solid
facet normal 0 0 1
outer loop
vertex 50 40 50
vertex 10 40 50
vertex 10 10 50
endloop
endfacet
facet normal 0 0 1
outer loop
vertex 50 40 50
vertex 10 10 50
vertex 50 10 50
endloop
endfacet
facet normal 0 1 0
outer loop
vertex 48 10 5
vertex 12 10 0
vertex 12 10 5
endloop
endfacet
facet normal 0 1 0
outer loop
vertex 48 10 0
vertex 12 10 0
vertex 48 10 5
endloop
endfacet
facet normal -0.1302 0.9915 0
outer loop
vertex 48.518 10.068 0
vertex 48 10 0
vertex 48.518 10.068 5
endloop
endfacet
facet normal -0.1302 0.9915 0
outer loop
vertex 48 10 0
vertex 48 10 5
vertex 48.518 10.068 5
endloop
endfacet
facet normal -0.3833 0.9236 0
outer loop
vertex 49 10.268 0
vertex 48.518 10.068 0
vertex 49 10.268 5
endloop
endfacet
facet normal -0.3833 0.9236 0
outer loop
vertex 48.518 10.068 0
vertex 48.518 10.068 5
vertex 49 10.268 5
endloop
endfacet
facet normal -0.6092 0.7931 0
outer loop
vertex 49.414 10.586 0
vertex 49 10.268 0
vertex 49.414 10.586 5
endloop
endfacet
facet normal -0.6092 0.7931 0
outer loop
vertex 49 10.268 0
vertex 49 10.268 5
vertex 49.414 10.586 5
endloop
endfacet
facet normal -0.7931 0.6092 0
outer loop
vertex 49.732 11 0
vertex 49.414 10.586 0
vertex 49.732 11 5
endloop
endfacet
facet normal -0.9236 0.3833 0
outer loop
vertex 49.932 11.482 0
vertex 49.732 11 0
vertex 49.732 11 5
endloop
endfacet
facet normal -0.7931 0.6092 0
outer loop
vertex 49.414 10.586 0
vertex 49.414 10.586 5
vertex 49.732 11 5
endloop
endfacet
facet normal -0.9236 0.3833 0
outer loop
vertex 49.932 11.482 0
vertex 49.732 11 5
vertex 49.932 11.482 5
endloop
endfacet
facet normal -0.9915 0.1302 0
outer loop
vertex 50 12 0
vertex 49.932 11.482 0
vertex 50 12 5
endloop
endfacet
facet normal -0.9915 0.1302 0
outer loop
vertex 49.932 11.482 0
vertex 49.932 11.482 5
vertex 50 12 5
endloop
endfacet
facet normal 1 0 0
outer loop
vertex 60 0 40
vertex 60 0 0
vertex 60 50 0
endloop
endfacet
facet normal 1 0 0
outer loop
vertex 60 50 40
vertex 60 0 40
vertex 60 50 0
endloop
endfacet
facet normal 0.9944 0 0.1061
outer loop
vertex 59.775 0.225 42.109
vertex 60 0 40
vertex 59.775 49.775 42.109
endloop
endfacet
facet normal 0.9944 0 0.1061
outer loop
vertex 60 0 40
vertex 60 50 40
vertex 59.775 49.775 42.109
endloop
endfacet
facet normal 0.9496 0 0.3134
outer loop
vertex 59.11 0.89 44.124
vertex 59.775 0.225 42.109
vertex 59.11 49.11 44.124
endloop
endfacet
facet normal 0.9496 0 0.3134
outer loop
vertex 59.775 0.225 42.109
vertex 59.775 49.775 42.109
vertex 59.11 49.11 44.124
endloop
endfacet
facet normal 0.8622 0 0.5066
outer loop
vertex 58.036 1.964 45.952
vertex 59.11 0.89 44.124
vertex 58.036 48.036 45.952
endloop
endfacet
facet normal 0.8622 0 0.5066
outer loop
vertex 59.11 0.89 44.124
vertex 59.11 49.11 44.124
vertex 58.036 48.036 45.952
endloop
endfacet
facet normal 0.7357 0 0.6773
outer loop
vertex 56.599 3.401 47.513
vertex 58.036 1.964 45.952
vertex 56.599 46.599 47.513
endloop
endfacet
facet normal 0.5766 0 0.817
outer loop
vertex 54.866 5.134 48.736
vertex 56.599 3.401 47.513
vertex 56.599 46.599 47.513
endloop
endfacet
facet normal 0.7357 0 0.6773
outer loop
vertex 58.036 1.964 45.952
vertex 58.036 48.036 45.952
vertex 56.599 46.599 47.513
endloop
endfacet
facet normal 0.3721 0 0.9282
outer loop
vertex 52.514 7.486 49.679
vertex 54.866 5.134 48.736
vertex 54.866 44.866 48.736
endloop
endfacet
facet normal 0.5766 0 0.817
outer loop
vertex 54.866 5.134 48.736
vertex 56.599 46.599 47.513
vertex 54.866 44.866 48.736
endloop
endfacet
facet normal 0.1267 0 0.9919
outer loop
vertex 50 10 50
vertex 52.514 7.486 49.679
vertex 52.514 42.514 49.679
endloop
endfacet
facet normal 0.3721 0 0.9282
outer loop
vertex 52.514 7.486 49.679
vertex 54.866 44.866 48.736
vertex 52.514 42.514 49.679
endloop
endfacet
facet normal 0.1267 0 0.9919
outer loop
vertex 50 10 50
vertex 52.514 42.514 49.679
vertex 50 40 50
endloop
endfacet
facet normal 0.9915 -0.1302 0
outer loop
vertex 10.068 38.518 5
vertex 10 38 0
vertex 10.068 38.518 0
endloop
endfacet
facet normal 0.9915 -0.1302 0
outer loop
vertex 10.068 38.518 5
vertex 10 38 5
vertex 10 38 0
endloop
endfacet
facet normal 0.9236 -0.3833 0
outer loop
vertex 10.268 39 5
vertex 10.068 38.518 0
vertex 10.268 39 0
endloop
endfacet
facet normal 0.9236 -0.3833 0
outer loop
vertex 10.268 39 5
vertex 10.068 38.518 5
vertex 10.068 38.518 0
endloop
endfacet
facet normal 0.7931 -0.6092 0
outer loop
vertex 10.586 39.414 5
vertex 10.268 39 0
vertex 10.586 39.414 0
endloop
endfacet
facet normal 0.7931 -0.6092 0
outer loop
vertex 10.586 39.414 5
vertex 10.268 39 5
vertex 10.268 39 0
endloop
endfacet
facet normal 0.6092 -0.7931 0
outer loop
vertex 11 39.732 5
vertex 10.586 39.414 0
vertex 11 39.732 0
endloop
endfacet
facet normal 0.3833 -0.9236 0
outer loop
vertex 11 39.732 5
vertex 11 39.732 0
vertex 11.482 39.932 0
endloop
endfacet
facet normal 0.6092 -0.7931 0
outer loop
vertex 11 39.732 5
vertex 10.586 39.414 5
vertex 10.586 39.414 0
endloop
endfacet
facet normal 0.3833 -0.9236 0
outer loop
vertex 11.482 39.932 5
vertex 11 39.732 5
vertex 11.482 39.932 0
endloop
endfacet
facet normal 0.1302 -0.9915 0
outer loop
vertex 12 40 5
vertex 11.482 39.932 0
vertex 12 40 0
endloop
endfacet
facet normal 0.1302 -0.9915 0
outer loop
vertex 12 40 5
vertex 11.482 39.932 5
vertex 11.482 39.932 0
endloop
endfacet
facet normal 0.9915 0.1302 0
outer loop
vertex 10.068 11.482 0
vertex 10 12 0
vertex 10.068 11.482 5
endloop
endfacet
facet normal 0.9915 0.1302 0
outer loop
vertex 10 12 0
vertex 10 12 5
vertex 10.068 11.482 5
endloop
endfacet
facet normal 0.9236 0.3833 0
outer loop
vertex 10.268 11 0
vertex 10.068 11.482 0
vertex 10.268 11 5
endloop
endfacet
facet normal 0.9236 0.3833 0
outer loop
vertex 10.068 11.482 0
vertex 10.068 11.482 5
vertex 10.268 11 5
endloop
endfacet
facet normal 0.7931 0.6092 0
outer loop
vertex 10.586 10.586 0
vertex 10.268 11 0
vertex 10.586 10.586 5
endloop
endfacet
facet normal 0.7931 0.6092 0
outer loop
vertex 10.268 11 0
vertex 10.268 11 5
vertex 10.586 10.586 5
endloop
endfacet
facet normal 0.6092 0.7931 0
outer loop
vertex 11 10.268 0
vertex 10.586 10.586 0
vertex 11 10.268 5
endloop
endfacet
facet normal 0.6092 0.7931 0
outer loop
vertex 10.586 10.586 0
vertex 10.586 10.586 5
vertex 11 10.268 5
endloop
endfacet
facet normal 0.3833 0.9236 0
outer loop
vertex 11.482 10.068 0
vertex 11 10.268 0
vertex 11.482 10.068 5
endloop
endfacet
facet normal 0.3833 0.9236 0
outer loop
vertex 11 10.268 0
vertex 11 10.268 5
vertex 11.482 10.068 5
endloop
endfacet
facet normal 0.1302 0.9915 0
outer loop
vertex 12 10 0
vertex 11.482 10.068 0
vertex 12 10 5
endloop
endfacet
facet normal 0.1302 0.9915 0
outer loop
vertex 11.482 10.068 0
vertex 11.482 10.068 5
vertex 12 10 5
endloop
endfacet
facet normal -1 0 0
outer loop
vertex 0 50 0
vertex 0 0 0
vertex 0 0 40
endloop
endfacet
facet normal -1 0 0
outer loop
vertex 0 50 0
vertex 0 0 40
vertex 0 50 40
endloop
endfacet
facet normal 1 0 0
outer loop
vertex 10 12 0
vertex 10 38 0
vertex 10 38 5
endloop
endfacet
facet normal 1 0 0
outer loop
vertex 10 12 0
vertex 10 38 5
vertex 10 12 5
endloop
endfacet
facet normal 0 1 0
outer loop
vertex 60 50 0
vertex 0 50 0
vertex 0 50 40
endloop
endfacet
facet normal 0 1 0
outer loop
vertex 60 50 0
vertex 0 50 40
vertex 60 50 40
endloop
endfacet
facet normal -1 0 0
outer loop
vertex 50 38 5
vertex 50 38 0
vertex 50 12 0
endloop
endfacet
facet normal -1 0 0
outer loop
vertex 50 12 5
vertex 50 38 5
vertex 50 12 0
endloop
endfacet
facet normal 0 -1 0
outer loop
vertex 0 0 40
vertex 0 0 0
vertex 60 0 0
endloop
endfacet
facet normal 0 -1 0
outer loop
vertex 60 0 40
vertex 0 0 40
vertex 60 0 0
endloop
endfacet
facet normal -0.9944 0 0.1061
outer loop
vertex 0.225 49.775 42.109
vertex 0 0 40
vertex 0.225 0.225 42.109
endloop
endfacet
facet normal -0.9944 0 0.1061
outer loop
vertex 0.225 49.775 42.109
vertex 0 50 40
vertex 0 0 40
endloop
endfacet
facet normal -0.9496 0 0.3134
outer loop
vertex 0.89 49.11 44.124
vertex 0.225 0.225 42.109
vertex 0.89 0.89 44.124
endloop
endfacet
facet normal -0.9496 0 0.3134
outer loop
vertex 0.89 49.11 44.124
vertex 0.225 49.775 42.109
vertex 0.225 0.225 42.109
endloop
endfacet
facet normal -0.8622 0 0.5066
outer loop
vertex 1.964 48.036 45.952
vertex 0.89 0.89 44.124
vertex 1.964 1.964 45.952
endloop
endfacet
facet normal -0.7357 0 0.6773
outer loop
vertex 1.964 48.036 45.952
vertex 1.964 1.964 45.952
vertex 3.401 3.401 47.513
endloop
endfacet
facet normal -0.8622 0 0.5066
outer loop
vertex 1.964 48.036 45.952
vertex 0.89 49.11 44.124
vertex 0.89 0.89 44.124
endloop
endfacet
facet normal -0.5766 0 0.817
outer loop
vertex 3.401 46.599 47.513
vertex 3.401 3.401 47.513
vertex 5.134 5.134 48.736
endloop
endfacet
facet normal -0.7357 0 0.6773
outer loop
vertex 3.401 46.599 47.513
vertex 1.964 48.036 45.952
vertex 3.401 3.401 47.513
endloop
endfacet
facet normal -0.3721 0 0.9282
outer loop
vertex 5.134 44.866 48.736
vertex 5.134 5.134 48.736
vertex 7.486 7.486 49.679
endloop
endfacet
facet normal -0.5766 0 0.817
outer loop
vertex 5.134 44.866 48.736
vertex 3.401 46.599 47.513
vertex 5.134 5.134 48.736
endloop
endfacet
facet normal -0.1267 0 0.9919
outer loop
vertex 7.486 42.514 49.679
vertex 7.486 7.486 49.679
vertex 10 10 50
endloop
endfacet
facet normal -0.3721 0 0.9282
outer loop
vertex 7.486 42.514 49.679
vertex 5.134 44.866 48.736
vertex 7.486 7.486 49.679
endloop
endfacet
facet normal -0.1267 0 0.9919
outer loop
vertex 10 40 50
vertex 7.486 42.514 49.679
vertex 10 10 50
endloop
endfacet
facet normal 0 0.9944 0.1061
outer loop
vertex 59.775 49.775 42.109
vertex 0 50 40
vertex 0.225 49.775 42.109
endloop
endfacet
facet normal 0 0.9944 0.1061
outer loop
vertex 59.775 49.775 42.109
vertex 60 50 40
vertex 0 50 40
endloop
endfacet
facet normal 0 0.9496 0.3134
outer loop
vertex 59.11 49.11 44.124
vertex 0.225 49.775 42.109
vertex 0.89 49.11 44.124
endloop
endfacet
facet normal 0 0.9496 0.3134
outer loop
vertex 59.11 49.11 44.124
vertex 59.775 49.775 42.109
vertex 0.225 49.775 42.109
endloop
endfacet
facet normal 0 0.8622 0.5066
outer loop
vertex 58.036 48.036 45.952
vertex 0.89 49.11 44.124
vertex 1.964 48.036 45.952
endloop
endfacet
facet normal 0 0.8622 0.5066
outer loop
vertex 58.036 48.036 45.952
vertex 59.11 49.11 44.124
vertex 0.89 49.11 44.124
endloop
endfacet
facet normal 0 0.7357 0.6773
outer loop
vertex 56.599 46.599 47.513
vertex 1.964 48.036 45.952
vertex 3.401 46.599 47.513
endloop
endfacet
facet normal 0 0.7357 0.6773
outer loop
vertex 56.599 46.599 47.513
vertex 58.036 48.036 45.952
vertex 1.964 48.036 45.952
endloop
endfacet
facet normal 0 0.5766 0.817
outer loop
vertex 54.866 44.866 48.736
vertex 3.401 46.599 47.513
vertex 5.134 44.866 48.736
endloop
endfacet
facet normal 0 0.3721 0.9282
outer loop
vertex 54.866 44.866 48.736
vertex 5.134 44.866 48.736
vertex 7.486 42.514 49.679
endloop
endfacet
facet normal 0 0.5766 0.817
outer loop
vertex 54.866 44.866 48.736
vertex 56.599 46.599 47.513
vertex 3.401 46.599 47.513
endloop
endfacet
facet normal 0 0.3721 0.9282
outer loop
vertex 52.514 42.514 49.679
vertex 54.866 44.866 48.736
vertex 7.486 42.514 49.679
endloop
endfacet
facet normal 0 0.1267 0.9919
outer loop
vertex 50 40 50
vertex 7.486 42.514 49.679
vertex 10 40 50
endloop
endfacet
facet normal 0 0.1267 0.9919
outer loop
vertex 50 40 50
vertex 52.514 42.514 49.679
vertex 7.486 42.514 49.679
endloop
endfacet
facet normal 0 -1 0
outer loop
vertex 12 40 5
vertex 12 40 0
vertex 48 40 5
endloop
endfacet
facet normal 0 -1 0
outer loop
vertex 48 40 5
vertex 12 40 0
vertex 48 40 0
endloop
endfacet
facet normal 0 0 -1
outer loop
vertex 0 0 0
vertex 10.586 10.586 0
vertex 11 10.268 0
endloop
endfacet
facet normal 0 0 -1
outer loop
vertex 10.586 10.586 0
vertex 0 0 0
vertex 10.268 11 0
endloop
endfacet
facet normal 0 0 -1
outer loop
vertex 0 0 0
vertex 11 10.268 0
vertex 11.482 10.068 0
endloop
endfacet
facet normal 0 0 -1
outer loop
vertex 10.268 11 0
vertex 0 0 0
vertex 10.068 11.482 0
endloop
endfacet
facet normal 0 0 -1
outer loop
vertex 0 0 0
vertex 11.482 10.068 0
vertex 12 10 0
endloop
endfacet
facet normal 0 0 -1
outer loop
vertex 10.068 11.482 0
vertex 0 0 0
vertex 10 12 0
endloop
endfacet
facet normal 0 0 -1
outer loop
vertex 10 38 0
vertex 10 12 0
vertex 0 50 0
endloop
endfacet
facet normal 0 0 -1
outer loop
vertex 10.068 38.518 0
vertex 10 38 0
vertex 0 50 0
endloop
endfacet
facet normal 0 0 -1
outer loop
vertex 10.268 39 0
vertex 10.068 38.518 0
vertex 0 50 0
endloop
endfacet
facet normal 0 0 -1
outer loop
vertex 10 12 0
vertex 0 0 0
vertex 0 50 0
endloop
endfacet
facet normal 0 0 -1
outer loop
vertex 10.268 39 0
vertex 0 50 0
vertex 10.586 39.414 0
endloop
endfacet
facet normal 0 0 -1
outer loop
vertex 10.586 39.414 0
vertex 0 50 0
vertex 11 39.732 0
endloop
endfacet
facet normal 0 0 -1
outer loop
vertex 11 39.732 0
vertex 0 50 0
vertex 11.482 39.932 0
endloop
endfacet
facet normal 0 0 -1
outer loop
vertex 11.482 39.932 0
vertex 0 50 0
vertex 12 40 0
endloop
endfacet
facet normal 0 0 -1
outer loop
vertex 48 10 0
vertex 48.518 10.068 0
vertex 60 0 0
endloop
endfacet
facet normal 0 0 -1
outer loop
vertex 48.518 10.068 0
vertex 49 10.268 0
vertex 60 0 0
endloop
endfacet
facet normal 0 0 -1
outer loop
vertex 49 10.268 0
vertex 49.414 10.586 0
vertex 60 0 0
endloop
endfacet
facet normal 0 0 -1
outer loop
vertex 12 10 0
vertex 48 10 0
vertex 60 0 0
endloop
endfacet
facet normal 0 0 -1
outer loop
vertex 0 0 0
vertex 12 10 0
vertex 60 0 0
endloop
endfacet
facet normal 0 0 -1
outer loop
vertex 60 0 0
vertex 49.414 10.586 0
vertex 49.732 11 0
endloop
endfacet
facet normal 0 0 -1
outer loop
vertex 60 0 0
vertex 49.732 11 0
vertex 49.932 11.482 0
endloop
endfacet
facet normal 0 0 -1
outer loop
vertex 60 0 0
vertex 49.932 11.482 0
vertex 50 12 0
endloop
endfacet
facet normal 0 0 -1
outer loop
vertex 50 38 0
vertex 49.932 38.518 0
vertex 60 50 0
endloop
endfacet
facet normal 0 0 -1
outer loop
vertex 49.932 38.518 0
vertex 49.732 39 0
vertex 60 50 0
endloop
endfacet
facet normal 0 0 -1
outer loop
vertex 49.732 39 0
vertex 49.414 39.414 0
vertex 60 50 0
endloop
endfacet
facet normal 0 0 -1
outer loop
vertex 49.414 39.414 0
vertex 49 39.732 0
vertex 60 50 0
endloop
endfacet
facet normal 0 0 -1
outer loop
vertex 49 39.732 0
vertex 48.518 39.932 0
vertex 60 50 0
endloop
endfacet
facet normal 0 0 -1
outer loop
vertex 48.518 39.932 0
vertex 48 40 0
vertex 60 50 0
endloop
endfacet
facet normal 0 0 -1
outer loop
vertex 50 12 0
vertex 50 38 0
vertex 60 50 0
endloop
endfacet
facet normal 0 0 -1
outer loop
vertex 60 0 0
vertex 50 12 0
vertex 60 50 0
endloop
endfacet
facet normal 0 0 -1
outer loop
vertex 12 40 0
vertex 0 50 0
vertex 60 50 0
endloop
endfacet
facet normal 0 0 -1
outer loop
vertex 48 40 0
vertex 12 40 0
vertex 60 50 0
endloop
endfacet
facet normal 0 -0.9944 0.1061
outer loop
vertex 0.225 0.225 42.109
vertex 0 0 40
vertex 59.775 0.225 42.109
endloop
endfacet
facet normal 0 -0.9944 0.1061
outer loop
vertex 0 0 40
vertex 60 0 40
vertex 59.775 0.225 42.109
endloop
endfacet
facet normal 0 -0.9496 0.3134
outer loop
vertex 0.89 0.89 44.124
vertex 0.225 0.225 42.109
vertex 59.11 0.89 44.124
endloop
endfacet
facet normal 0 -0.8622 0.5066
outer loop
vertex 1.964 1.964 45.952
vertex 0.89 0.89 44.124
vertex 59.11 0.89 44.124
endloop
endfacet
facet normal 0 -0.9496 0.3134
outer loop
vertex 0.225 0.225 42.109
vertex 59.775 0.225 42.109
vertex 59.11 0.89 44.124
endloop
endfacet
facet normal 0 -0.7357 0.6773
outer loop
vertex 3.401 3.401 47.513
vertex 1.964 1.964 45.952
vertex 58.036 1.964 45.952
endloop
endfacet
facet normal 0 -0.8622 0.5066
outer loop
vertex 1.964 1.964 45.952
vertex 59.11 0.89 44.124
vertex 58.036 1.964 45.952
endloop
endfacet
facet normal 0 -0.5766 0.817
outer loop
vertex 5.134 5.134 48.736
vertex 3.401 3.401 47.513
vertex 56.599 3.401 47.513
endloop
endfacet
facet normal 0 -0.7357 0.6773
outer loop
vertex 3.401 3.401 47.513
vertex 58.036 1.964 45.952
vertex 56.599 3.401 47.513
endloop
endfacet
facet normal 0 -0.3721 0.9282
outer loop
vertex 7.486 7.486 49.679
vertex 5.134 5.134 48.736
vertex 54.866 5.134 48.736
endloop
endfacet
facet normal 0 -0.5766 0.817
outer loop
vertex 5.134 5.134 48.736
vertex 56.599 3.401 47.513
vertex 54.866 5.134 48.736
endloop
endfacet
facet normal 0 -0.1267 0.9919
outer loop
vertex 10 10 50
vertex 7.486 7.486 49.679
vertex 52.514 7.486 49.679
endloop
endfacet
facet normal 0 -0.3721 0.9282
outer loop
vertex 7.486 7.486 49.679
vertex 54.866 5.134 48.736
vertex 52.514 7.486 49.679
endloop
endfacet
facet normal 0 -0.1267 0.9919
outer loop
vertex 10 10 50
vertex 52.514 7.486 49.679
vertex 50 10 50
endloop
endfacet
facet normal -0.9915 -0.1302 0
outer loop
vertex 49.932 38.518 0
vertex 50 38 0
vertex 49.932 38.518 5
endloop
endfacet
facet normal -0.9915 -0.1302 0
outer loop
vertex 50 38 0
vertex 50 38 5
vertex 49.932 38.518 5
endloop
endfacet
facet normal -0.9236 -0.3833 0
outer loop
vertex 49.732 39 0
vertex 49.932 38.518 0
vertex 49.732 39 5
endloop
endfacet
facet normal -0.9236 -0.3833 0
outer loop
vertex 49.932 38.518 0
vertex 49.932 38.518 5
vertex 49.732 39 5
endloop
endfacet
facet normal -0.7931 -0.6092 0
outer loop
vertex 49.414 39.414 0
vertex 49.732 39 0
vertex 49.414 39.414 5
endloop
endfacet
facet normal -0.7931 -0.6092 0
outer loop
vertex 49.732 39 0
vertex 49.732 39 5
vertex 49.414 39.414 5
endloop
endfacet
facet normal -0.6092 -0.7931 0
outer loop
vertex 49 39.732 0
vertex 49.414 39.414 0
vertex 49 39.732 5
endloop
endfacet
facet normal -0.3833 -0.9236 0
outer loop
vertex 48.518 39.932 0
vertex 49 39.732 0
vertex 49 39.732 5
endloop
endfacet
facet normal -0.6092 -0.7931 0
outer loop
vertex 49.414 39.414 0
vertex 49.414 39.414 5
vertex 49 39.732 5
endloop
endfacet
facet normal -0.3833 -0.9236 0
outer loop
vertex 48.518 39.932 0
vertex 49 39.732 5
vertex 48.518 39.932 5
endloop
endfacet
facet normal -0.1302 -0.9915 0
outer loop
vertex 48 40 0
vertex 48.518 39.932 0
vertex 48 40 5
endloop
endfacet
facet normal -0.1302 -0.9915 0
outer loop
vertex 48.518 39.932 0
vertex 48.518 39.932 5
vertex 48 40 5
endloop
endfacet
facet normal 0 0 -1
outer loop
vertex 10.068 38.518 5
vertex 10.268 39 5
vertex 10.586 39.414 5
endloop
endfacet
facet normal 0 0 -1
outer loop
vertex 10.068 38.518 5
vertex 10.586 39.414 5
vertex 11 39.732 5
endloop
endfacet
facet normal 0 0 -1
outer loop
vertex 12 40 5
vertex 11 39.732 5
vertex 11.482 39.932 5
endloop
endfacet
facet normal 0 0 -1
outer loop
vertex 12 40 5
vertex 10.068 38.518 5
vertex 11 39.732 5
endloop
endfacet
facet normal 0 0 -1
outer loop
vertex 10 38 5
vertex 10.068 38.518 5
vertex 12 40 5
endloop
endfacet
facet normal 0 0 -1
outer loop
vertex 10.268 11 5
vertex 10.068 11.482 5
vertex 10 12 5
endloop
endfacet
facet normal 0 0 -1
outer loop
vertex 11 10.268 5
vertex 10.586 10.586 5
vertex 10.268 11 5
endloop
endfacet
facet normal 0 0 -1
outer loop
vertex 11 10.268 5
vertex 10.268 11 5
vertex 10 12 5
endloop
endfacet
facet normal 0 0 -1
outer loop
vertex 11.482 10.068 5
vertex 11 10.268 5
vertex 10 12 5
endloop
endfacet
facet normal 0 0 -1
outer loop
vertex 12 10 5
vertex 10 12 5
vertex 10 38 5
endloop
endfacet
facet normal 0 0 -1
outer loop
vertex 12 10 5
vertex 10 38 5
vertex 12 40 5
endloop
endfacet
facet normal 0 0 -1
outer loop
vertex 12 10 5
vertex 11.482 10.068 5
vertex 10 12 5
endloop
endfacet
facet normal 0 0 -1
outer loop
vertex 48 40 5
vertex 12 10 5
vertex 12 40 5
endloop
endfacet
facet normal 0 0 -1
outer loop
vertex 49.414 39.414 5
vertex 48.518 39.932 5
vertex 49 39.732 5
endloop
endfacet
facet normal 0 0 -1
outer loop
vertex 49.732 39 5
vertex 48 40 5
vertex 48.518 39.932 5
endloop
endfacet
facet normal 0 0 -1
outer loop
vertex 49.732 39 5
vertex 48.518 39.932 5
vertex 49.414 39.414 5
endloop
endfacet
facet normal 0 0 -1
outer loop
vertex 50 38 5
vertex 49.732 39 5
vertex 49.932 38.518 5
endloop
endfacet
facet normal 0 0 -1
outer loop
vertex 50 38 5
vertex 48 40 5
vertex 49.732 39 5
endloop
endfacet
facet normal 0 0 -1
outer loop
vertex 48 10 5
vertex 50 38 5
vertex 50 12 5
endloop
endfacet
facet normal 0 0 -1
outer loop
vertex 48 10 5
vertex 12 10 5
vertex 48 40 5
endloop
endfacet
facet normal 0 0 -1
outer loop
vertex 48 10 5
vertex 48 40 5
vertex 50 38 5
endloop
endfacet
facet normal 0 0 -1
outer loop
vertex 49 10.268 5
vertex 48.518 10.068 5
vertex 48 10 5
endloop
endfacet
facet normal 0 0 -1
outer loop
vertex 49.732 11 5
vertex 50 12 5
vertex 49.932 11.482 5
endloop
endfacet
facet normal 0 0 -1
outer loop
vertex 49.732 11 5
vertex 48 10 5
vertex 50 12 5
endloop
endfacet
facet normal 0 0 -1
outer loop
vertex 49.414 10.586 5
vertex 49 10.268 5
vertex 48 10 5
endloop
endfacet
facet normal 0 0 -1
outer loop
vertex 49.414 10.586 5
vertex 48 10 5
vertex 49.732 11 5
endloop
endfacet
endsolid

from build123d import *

# Parameters (mm, degrees)
F0_W     = 60
F0_H     = 50
F1_DEPTH = 50
F2_W     = 40
F2_H     = 30
F3_DEPTH = 5
F4_R     = 2
F5_R     = 10


with BuildPart() as f1:
    # F0 (on Top) → F1 (new body)
    with BuildSketch(Plane.XY):
        with Locations((30, 25)):
            Rectangle(F0_W, F0_H)
    extrude(amount=F1_DEPTH)

    # F2 (on face) → F3 (cut)
    with BuildSketch(Plane(origin=(0, 0, 0), x_dir=(1, 0, 0), z_dir=(0, 0, -1))):
        with Locations((30, -25)):
            Rectangle(F2_W, F2_H)
    extrude(amount=-F3_DEPTH, mode=Mode.SUBTRACT)

    # F4
    f4_edges = [f1.edges().sort_by_distance(p)[0] for p in [
        (50, 40, 2.5),
        (10, 40, 2.5),
        (10, 10, 2.5),
        (50, 10, 2.5),
    ]]
    fillet(f4_edges, radius=F4_R)

    # F5
    f5_edges = [f1.edges().sort_by_distance(p)[0] for p in [
        (0, 25, 50),
        (30, 0, 50),
        (60, 25, 50),
        (30, 50, 50),
    ]]
    fillet(f5_edges, radius=F5_R)


solid = f1.part
